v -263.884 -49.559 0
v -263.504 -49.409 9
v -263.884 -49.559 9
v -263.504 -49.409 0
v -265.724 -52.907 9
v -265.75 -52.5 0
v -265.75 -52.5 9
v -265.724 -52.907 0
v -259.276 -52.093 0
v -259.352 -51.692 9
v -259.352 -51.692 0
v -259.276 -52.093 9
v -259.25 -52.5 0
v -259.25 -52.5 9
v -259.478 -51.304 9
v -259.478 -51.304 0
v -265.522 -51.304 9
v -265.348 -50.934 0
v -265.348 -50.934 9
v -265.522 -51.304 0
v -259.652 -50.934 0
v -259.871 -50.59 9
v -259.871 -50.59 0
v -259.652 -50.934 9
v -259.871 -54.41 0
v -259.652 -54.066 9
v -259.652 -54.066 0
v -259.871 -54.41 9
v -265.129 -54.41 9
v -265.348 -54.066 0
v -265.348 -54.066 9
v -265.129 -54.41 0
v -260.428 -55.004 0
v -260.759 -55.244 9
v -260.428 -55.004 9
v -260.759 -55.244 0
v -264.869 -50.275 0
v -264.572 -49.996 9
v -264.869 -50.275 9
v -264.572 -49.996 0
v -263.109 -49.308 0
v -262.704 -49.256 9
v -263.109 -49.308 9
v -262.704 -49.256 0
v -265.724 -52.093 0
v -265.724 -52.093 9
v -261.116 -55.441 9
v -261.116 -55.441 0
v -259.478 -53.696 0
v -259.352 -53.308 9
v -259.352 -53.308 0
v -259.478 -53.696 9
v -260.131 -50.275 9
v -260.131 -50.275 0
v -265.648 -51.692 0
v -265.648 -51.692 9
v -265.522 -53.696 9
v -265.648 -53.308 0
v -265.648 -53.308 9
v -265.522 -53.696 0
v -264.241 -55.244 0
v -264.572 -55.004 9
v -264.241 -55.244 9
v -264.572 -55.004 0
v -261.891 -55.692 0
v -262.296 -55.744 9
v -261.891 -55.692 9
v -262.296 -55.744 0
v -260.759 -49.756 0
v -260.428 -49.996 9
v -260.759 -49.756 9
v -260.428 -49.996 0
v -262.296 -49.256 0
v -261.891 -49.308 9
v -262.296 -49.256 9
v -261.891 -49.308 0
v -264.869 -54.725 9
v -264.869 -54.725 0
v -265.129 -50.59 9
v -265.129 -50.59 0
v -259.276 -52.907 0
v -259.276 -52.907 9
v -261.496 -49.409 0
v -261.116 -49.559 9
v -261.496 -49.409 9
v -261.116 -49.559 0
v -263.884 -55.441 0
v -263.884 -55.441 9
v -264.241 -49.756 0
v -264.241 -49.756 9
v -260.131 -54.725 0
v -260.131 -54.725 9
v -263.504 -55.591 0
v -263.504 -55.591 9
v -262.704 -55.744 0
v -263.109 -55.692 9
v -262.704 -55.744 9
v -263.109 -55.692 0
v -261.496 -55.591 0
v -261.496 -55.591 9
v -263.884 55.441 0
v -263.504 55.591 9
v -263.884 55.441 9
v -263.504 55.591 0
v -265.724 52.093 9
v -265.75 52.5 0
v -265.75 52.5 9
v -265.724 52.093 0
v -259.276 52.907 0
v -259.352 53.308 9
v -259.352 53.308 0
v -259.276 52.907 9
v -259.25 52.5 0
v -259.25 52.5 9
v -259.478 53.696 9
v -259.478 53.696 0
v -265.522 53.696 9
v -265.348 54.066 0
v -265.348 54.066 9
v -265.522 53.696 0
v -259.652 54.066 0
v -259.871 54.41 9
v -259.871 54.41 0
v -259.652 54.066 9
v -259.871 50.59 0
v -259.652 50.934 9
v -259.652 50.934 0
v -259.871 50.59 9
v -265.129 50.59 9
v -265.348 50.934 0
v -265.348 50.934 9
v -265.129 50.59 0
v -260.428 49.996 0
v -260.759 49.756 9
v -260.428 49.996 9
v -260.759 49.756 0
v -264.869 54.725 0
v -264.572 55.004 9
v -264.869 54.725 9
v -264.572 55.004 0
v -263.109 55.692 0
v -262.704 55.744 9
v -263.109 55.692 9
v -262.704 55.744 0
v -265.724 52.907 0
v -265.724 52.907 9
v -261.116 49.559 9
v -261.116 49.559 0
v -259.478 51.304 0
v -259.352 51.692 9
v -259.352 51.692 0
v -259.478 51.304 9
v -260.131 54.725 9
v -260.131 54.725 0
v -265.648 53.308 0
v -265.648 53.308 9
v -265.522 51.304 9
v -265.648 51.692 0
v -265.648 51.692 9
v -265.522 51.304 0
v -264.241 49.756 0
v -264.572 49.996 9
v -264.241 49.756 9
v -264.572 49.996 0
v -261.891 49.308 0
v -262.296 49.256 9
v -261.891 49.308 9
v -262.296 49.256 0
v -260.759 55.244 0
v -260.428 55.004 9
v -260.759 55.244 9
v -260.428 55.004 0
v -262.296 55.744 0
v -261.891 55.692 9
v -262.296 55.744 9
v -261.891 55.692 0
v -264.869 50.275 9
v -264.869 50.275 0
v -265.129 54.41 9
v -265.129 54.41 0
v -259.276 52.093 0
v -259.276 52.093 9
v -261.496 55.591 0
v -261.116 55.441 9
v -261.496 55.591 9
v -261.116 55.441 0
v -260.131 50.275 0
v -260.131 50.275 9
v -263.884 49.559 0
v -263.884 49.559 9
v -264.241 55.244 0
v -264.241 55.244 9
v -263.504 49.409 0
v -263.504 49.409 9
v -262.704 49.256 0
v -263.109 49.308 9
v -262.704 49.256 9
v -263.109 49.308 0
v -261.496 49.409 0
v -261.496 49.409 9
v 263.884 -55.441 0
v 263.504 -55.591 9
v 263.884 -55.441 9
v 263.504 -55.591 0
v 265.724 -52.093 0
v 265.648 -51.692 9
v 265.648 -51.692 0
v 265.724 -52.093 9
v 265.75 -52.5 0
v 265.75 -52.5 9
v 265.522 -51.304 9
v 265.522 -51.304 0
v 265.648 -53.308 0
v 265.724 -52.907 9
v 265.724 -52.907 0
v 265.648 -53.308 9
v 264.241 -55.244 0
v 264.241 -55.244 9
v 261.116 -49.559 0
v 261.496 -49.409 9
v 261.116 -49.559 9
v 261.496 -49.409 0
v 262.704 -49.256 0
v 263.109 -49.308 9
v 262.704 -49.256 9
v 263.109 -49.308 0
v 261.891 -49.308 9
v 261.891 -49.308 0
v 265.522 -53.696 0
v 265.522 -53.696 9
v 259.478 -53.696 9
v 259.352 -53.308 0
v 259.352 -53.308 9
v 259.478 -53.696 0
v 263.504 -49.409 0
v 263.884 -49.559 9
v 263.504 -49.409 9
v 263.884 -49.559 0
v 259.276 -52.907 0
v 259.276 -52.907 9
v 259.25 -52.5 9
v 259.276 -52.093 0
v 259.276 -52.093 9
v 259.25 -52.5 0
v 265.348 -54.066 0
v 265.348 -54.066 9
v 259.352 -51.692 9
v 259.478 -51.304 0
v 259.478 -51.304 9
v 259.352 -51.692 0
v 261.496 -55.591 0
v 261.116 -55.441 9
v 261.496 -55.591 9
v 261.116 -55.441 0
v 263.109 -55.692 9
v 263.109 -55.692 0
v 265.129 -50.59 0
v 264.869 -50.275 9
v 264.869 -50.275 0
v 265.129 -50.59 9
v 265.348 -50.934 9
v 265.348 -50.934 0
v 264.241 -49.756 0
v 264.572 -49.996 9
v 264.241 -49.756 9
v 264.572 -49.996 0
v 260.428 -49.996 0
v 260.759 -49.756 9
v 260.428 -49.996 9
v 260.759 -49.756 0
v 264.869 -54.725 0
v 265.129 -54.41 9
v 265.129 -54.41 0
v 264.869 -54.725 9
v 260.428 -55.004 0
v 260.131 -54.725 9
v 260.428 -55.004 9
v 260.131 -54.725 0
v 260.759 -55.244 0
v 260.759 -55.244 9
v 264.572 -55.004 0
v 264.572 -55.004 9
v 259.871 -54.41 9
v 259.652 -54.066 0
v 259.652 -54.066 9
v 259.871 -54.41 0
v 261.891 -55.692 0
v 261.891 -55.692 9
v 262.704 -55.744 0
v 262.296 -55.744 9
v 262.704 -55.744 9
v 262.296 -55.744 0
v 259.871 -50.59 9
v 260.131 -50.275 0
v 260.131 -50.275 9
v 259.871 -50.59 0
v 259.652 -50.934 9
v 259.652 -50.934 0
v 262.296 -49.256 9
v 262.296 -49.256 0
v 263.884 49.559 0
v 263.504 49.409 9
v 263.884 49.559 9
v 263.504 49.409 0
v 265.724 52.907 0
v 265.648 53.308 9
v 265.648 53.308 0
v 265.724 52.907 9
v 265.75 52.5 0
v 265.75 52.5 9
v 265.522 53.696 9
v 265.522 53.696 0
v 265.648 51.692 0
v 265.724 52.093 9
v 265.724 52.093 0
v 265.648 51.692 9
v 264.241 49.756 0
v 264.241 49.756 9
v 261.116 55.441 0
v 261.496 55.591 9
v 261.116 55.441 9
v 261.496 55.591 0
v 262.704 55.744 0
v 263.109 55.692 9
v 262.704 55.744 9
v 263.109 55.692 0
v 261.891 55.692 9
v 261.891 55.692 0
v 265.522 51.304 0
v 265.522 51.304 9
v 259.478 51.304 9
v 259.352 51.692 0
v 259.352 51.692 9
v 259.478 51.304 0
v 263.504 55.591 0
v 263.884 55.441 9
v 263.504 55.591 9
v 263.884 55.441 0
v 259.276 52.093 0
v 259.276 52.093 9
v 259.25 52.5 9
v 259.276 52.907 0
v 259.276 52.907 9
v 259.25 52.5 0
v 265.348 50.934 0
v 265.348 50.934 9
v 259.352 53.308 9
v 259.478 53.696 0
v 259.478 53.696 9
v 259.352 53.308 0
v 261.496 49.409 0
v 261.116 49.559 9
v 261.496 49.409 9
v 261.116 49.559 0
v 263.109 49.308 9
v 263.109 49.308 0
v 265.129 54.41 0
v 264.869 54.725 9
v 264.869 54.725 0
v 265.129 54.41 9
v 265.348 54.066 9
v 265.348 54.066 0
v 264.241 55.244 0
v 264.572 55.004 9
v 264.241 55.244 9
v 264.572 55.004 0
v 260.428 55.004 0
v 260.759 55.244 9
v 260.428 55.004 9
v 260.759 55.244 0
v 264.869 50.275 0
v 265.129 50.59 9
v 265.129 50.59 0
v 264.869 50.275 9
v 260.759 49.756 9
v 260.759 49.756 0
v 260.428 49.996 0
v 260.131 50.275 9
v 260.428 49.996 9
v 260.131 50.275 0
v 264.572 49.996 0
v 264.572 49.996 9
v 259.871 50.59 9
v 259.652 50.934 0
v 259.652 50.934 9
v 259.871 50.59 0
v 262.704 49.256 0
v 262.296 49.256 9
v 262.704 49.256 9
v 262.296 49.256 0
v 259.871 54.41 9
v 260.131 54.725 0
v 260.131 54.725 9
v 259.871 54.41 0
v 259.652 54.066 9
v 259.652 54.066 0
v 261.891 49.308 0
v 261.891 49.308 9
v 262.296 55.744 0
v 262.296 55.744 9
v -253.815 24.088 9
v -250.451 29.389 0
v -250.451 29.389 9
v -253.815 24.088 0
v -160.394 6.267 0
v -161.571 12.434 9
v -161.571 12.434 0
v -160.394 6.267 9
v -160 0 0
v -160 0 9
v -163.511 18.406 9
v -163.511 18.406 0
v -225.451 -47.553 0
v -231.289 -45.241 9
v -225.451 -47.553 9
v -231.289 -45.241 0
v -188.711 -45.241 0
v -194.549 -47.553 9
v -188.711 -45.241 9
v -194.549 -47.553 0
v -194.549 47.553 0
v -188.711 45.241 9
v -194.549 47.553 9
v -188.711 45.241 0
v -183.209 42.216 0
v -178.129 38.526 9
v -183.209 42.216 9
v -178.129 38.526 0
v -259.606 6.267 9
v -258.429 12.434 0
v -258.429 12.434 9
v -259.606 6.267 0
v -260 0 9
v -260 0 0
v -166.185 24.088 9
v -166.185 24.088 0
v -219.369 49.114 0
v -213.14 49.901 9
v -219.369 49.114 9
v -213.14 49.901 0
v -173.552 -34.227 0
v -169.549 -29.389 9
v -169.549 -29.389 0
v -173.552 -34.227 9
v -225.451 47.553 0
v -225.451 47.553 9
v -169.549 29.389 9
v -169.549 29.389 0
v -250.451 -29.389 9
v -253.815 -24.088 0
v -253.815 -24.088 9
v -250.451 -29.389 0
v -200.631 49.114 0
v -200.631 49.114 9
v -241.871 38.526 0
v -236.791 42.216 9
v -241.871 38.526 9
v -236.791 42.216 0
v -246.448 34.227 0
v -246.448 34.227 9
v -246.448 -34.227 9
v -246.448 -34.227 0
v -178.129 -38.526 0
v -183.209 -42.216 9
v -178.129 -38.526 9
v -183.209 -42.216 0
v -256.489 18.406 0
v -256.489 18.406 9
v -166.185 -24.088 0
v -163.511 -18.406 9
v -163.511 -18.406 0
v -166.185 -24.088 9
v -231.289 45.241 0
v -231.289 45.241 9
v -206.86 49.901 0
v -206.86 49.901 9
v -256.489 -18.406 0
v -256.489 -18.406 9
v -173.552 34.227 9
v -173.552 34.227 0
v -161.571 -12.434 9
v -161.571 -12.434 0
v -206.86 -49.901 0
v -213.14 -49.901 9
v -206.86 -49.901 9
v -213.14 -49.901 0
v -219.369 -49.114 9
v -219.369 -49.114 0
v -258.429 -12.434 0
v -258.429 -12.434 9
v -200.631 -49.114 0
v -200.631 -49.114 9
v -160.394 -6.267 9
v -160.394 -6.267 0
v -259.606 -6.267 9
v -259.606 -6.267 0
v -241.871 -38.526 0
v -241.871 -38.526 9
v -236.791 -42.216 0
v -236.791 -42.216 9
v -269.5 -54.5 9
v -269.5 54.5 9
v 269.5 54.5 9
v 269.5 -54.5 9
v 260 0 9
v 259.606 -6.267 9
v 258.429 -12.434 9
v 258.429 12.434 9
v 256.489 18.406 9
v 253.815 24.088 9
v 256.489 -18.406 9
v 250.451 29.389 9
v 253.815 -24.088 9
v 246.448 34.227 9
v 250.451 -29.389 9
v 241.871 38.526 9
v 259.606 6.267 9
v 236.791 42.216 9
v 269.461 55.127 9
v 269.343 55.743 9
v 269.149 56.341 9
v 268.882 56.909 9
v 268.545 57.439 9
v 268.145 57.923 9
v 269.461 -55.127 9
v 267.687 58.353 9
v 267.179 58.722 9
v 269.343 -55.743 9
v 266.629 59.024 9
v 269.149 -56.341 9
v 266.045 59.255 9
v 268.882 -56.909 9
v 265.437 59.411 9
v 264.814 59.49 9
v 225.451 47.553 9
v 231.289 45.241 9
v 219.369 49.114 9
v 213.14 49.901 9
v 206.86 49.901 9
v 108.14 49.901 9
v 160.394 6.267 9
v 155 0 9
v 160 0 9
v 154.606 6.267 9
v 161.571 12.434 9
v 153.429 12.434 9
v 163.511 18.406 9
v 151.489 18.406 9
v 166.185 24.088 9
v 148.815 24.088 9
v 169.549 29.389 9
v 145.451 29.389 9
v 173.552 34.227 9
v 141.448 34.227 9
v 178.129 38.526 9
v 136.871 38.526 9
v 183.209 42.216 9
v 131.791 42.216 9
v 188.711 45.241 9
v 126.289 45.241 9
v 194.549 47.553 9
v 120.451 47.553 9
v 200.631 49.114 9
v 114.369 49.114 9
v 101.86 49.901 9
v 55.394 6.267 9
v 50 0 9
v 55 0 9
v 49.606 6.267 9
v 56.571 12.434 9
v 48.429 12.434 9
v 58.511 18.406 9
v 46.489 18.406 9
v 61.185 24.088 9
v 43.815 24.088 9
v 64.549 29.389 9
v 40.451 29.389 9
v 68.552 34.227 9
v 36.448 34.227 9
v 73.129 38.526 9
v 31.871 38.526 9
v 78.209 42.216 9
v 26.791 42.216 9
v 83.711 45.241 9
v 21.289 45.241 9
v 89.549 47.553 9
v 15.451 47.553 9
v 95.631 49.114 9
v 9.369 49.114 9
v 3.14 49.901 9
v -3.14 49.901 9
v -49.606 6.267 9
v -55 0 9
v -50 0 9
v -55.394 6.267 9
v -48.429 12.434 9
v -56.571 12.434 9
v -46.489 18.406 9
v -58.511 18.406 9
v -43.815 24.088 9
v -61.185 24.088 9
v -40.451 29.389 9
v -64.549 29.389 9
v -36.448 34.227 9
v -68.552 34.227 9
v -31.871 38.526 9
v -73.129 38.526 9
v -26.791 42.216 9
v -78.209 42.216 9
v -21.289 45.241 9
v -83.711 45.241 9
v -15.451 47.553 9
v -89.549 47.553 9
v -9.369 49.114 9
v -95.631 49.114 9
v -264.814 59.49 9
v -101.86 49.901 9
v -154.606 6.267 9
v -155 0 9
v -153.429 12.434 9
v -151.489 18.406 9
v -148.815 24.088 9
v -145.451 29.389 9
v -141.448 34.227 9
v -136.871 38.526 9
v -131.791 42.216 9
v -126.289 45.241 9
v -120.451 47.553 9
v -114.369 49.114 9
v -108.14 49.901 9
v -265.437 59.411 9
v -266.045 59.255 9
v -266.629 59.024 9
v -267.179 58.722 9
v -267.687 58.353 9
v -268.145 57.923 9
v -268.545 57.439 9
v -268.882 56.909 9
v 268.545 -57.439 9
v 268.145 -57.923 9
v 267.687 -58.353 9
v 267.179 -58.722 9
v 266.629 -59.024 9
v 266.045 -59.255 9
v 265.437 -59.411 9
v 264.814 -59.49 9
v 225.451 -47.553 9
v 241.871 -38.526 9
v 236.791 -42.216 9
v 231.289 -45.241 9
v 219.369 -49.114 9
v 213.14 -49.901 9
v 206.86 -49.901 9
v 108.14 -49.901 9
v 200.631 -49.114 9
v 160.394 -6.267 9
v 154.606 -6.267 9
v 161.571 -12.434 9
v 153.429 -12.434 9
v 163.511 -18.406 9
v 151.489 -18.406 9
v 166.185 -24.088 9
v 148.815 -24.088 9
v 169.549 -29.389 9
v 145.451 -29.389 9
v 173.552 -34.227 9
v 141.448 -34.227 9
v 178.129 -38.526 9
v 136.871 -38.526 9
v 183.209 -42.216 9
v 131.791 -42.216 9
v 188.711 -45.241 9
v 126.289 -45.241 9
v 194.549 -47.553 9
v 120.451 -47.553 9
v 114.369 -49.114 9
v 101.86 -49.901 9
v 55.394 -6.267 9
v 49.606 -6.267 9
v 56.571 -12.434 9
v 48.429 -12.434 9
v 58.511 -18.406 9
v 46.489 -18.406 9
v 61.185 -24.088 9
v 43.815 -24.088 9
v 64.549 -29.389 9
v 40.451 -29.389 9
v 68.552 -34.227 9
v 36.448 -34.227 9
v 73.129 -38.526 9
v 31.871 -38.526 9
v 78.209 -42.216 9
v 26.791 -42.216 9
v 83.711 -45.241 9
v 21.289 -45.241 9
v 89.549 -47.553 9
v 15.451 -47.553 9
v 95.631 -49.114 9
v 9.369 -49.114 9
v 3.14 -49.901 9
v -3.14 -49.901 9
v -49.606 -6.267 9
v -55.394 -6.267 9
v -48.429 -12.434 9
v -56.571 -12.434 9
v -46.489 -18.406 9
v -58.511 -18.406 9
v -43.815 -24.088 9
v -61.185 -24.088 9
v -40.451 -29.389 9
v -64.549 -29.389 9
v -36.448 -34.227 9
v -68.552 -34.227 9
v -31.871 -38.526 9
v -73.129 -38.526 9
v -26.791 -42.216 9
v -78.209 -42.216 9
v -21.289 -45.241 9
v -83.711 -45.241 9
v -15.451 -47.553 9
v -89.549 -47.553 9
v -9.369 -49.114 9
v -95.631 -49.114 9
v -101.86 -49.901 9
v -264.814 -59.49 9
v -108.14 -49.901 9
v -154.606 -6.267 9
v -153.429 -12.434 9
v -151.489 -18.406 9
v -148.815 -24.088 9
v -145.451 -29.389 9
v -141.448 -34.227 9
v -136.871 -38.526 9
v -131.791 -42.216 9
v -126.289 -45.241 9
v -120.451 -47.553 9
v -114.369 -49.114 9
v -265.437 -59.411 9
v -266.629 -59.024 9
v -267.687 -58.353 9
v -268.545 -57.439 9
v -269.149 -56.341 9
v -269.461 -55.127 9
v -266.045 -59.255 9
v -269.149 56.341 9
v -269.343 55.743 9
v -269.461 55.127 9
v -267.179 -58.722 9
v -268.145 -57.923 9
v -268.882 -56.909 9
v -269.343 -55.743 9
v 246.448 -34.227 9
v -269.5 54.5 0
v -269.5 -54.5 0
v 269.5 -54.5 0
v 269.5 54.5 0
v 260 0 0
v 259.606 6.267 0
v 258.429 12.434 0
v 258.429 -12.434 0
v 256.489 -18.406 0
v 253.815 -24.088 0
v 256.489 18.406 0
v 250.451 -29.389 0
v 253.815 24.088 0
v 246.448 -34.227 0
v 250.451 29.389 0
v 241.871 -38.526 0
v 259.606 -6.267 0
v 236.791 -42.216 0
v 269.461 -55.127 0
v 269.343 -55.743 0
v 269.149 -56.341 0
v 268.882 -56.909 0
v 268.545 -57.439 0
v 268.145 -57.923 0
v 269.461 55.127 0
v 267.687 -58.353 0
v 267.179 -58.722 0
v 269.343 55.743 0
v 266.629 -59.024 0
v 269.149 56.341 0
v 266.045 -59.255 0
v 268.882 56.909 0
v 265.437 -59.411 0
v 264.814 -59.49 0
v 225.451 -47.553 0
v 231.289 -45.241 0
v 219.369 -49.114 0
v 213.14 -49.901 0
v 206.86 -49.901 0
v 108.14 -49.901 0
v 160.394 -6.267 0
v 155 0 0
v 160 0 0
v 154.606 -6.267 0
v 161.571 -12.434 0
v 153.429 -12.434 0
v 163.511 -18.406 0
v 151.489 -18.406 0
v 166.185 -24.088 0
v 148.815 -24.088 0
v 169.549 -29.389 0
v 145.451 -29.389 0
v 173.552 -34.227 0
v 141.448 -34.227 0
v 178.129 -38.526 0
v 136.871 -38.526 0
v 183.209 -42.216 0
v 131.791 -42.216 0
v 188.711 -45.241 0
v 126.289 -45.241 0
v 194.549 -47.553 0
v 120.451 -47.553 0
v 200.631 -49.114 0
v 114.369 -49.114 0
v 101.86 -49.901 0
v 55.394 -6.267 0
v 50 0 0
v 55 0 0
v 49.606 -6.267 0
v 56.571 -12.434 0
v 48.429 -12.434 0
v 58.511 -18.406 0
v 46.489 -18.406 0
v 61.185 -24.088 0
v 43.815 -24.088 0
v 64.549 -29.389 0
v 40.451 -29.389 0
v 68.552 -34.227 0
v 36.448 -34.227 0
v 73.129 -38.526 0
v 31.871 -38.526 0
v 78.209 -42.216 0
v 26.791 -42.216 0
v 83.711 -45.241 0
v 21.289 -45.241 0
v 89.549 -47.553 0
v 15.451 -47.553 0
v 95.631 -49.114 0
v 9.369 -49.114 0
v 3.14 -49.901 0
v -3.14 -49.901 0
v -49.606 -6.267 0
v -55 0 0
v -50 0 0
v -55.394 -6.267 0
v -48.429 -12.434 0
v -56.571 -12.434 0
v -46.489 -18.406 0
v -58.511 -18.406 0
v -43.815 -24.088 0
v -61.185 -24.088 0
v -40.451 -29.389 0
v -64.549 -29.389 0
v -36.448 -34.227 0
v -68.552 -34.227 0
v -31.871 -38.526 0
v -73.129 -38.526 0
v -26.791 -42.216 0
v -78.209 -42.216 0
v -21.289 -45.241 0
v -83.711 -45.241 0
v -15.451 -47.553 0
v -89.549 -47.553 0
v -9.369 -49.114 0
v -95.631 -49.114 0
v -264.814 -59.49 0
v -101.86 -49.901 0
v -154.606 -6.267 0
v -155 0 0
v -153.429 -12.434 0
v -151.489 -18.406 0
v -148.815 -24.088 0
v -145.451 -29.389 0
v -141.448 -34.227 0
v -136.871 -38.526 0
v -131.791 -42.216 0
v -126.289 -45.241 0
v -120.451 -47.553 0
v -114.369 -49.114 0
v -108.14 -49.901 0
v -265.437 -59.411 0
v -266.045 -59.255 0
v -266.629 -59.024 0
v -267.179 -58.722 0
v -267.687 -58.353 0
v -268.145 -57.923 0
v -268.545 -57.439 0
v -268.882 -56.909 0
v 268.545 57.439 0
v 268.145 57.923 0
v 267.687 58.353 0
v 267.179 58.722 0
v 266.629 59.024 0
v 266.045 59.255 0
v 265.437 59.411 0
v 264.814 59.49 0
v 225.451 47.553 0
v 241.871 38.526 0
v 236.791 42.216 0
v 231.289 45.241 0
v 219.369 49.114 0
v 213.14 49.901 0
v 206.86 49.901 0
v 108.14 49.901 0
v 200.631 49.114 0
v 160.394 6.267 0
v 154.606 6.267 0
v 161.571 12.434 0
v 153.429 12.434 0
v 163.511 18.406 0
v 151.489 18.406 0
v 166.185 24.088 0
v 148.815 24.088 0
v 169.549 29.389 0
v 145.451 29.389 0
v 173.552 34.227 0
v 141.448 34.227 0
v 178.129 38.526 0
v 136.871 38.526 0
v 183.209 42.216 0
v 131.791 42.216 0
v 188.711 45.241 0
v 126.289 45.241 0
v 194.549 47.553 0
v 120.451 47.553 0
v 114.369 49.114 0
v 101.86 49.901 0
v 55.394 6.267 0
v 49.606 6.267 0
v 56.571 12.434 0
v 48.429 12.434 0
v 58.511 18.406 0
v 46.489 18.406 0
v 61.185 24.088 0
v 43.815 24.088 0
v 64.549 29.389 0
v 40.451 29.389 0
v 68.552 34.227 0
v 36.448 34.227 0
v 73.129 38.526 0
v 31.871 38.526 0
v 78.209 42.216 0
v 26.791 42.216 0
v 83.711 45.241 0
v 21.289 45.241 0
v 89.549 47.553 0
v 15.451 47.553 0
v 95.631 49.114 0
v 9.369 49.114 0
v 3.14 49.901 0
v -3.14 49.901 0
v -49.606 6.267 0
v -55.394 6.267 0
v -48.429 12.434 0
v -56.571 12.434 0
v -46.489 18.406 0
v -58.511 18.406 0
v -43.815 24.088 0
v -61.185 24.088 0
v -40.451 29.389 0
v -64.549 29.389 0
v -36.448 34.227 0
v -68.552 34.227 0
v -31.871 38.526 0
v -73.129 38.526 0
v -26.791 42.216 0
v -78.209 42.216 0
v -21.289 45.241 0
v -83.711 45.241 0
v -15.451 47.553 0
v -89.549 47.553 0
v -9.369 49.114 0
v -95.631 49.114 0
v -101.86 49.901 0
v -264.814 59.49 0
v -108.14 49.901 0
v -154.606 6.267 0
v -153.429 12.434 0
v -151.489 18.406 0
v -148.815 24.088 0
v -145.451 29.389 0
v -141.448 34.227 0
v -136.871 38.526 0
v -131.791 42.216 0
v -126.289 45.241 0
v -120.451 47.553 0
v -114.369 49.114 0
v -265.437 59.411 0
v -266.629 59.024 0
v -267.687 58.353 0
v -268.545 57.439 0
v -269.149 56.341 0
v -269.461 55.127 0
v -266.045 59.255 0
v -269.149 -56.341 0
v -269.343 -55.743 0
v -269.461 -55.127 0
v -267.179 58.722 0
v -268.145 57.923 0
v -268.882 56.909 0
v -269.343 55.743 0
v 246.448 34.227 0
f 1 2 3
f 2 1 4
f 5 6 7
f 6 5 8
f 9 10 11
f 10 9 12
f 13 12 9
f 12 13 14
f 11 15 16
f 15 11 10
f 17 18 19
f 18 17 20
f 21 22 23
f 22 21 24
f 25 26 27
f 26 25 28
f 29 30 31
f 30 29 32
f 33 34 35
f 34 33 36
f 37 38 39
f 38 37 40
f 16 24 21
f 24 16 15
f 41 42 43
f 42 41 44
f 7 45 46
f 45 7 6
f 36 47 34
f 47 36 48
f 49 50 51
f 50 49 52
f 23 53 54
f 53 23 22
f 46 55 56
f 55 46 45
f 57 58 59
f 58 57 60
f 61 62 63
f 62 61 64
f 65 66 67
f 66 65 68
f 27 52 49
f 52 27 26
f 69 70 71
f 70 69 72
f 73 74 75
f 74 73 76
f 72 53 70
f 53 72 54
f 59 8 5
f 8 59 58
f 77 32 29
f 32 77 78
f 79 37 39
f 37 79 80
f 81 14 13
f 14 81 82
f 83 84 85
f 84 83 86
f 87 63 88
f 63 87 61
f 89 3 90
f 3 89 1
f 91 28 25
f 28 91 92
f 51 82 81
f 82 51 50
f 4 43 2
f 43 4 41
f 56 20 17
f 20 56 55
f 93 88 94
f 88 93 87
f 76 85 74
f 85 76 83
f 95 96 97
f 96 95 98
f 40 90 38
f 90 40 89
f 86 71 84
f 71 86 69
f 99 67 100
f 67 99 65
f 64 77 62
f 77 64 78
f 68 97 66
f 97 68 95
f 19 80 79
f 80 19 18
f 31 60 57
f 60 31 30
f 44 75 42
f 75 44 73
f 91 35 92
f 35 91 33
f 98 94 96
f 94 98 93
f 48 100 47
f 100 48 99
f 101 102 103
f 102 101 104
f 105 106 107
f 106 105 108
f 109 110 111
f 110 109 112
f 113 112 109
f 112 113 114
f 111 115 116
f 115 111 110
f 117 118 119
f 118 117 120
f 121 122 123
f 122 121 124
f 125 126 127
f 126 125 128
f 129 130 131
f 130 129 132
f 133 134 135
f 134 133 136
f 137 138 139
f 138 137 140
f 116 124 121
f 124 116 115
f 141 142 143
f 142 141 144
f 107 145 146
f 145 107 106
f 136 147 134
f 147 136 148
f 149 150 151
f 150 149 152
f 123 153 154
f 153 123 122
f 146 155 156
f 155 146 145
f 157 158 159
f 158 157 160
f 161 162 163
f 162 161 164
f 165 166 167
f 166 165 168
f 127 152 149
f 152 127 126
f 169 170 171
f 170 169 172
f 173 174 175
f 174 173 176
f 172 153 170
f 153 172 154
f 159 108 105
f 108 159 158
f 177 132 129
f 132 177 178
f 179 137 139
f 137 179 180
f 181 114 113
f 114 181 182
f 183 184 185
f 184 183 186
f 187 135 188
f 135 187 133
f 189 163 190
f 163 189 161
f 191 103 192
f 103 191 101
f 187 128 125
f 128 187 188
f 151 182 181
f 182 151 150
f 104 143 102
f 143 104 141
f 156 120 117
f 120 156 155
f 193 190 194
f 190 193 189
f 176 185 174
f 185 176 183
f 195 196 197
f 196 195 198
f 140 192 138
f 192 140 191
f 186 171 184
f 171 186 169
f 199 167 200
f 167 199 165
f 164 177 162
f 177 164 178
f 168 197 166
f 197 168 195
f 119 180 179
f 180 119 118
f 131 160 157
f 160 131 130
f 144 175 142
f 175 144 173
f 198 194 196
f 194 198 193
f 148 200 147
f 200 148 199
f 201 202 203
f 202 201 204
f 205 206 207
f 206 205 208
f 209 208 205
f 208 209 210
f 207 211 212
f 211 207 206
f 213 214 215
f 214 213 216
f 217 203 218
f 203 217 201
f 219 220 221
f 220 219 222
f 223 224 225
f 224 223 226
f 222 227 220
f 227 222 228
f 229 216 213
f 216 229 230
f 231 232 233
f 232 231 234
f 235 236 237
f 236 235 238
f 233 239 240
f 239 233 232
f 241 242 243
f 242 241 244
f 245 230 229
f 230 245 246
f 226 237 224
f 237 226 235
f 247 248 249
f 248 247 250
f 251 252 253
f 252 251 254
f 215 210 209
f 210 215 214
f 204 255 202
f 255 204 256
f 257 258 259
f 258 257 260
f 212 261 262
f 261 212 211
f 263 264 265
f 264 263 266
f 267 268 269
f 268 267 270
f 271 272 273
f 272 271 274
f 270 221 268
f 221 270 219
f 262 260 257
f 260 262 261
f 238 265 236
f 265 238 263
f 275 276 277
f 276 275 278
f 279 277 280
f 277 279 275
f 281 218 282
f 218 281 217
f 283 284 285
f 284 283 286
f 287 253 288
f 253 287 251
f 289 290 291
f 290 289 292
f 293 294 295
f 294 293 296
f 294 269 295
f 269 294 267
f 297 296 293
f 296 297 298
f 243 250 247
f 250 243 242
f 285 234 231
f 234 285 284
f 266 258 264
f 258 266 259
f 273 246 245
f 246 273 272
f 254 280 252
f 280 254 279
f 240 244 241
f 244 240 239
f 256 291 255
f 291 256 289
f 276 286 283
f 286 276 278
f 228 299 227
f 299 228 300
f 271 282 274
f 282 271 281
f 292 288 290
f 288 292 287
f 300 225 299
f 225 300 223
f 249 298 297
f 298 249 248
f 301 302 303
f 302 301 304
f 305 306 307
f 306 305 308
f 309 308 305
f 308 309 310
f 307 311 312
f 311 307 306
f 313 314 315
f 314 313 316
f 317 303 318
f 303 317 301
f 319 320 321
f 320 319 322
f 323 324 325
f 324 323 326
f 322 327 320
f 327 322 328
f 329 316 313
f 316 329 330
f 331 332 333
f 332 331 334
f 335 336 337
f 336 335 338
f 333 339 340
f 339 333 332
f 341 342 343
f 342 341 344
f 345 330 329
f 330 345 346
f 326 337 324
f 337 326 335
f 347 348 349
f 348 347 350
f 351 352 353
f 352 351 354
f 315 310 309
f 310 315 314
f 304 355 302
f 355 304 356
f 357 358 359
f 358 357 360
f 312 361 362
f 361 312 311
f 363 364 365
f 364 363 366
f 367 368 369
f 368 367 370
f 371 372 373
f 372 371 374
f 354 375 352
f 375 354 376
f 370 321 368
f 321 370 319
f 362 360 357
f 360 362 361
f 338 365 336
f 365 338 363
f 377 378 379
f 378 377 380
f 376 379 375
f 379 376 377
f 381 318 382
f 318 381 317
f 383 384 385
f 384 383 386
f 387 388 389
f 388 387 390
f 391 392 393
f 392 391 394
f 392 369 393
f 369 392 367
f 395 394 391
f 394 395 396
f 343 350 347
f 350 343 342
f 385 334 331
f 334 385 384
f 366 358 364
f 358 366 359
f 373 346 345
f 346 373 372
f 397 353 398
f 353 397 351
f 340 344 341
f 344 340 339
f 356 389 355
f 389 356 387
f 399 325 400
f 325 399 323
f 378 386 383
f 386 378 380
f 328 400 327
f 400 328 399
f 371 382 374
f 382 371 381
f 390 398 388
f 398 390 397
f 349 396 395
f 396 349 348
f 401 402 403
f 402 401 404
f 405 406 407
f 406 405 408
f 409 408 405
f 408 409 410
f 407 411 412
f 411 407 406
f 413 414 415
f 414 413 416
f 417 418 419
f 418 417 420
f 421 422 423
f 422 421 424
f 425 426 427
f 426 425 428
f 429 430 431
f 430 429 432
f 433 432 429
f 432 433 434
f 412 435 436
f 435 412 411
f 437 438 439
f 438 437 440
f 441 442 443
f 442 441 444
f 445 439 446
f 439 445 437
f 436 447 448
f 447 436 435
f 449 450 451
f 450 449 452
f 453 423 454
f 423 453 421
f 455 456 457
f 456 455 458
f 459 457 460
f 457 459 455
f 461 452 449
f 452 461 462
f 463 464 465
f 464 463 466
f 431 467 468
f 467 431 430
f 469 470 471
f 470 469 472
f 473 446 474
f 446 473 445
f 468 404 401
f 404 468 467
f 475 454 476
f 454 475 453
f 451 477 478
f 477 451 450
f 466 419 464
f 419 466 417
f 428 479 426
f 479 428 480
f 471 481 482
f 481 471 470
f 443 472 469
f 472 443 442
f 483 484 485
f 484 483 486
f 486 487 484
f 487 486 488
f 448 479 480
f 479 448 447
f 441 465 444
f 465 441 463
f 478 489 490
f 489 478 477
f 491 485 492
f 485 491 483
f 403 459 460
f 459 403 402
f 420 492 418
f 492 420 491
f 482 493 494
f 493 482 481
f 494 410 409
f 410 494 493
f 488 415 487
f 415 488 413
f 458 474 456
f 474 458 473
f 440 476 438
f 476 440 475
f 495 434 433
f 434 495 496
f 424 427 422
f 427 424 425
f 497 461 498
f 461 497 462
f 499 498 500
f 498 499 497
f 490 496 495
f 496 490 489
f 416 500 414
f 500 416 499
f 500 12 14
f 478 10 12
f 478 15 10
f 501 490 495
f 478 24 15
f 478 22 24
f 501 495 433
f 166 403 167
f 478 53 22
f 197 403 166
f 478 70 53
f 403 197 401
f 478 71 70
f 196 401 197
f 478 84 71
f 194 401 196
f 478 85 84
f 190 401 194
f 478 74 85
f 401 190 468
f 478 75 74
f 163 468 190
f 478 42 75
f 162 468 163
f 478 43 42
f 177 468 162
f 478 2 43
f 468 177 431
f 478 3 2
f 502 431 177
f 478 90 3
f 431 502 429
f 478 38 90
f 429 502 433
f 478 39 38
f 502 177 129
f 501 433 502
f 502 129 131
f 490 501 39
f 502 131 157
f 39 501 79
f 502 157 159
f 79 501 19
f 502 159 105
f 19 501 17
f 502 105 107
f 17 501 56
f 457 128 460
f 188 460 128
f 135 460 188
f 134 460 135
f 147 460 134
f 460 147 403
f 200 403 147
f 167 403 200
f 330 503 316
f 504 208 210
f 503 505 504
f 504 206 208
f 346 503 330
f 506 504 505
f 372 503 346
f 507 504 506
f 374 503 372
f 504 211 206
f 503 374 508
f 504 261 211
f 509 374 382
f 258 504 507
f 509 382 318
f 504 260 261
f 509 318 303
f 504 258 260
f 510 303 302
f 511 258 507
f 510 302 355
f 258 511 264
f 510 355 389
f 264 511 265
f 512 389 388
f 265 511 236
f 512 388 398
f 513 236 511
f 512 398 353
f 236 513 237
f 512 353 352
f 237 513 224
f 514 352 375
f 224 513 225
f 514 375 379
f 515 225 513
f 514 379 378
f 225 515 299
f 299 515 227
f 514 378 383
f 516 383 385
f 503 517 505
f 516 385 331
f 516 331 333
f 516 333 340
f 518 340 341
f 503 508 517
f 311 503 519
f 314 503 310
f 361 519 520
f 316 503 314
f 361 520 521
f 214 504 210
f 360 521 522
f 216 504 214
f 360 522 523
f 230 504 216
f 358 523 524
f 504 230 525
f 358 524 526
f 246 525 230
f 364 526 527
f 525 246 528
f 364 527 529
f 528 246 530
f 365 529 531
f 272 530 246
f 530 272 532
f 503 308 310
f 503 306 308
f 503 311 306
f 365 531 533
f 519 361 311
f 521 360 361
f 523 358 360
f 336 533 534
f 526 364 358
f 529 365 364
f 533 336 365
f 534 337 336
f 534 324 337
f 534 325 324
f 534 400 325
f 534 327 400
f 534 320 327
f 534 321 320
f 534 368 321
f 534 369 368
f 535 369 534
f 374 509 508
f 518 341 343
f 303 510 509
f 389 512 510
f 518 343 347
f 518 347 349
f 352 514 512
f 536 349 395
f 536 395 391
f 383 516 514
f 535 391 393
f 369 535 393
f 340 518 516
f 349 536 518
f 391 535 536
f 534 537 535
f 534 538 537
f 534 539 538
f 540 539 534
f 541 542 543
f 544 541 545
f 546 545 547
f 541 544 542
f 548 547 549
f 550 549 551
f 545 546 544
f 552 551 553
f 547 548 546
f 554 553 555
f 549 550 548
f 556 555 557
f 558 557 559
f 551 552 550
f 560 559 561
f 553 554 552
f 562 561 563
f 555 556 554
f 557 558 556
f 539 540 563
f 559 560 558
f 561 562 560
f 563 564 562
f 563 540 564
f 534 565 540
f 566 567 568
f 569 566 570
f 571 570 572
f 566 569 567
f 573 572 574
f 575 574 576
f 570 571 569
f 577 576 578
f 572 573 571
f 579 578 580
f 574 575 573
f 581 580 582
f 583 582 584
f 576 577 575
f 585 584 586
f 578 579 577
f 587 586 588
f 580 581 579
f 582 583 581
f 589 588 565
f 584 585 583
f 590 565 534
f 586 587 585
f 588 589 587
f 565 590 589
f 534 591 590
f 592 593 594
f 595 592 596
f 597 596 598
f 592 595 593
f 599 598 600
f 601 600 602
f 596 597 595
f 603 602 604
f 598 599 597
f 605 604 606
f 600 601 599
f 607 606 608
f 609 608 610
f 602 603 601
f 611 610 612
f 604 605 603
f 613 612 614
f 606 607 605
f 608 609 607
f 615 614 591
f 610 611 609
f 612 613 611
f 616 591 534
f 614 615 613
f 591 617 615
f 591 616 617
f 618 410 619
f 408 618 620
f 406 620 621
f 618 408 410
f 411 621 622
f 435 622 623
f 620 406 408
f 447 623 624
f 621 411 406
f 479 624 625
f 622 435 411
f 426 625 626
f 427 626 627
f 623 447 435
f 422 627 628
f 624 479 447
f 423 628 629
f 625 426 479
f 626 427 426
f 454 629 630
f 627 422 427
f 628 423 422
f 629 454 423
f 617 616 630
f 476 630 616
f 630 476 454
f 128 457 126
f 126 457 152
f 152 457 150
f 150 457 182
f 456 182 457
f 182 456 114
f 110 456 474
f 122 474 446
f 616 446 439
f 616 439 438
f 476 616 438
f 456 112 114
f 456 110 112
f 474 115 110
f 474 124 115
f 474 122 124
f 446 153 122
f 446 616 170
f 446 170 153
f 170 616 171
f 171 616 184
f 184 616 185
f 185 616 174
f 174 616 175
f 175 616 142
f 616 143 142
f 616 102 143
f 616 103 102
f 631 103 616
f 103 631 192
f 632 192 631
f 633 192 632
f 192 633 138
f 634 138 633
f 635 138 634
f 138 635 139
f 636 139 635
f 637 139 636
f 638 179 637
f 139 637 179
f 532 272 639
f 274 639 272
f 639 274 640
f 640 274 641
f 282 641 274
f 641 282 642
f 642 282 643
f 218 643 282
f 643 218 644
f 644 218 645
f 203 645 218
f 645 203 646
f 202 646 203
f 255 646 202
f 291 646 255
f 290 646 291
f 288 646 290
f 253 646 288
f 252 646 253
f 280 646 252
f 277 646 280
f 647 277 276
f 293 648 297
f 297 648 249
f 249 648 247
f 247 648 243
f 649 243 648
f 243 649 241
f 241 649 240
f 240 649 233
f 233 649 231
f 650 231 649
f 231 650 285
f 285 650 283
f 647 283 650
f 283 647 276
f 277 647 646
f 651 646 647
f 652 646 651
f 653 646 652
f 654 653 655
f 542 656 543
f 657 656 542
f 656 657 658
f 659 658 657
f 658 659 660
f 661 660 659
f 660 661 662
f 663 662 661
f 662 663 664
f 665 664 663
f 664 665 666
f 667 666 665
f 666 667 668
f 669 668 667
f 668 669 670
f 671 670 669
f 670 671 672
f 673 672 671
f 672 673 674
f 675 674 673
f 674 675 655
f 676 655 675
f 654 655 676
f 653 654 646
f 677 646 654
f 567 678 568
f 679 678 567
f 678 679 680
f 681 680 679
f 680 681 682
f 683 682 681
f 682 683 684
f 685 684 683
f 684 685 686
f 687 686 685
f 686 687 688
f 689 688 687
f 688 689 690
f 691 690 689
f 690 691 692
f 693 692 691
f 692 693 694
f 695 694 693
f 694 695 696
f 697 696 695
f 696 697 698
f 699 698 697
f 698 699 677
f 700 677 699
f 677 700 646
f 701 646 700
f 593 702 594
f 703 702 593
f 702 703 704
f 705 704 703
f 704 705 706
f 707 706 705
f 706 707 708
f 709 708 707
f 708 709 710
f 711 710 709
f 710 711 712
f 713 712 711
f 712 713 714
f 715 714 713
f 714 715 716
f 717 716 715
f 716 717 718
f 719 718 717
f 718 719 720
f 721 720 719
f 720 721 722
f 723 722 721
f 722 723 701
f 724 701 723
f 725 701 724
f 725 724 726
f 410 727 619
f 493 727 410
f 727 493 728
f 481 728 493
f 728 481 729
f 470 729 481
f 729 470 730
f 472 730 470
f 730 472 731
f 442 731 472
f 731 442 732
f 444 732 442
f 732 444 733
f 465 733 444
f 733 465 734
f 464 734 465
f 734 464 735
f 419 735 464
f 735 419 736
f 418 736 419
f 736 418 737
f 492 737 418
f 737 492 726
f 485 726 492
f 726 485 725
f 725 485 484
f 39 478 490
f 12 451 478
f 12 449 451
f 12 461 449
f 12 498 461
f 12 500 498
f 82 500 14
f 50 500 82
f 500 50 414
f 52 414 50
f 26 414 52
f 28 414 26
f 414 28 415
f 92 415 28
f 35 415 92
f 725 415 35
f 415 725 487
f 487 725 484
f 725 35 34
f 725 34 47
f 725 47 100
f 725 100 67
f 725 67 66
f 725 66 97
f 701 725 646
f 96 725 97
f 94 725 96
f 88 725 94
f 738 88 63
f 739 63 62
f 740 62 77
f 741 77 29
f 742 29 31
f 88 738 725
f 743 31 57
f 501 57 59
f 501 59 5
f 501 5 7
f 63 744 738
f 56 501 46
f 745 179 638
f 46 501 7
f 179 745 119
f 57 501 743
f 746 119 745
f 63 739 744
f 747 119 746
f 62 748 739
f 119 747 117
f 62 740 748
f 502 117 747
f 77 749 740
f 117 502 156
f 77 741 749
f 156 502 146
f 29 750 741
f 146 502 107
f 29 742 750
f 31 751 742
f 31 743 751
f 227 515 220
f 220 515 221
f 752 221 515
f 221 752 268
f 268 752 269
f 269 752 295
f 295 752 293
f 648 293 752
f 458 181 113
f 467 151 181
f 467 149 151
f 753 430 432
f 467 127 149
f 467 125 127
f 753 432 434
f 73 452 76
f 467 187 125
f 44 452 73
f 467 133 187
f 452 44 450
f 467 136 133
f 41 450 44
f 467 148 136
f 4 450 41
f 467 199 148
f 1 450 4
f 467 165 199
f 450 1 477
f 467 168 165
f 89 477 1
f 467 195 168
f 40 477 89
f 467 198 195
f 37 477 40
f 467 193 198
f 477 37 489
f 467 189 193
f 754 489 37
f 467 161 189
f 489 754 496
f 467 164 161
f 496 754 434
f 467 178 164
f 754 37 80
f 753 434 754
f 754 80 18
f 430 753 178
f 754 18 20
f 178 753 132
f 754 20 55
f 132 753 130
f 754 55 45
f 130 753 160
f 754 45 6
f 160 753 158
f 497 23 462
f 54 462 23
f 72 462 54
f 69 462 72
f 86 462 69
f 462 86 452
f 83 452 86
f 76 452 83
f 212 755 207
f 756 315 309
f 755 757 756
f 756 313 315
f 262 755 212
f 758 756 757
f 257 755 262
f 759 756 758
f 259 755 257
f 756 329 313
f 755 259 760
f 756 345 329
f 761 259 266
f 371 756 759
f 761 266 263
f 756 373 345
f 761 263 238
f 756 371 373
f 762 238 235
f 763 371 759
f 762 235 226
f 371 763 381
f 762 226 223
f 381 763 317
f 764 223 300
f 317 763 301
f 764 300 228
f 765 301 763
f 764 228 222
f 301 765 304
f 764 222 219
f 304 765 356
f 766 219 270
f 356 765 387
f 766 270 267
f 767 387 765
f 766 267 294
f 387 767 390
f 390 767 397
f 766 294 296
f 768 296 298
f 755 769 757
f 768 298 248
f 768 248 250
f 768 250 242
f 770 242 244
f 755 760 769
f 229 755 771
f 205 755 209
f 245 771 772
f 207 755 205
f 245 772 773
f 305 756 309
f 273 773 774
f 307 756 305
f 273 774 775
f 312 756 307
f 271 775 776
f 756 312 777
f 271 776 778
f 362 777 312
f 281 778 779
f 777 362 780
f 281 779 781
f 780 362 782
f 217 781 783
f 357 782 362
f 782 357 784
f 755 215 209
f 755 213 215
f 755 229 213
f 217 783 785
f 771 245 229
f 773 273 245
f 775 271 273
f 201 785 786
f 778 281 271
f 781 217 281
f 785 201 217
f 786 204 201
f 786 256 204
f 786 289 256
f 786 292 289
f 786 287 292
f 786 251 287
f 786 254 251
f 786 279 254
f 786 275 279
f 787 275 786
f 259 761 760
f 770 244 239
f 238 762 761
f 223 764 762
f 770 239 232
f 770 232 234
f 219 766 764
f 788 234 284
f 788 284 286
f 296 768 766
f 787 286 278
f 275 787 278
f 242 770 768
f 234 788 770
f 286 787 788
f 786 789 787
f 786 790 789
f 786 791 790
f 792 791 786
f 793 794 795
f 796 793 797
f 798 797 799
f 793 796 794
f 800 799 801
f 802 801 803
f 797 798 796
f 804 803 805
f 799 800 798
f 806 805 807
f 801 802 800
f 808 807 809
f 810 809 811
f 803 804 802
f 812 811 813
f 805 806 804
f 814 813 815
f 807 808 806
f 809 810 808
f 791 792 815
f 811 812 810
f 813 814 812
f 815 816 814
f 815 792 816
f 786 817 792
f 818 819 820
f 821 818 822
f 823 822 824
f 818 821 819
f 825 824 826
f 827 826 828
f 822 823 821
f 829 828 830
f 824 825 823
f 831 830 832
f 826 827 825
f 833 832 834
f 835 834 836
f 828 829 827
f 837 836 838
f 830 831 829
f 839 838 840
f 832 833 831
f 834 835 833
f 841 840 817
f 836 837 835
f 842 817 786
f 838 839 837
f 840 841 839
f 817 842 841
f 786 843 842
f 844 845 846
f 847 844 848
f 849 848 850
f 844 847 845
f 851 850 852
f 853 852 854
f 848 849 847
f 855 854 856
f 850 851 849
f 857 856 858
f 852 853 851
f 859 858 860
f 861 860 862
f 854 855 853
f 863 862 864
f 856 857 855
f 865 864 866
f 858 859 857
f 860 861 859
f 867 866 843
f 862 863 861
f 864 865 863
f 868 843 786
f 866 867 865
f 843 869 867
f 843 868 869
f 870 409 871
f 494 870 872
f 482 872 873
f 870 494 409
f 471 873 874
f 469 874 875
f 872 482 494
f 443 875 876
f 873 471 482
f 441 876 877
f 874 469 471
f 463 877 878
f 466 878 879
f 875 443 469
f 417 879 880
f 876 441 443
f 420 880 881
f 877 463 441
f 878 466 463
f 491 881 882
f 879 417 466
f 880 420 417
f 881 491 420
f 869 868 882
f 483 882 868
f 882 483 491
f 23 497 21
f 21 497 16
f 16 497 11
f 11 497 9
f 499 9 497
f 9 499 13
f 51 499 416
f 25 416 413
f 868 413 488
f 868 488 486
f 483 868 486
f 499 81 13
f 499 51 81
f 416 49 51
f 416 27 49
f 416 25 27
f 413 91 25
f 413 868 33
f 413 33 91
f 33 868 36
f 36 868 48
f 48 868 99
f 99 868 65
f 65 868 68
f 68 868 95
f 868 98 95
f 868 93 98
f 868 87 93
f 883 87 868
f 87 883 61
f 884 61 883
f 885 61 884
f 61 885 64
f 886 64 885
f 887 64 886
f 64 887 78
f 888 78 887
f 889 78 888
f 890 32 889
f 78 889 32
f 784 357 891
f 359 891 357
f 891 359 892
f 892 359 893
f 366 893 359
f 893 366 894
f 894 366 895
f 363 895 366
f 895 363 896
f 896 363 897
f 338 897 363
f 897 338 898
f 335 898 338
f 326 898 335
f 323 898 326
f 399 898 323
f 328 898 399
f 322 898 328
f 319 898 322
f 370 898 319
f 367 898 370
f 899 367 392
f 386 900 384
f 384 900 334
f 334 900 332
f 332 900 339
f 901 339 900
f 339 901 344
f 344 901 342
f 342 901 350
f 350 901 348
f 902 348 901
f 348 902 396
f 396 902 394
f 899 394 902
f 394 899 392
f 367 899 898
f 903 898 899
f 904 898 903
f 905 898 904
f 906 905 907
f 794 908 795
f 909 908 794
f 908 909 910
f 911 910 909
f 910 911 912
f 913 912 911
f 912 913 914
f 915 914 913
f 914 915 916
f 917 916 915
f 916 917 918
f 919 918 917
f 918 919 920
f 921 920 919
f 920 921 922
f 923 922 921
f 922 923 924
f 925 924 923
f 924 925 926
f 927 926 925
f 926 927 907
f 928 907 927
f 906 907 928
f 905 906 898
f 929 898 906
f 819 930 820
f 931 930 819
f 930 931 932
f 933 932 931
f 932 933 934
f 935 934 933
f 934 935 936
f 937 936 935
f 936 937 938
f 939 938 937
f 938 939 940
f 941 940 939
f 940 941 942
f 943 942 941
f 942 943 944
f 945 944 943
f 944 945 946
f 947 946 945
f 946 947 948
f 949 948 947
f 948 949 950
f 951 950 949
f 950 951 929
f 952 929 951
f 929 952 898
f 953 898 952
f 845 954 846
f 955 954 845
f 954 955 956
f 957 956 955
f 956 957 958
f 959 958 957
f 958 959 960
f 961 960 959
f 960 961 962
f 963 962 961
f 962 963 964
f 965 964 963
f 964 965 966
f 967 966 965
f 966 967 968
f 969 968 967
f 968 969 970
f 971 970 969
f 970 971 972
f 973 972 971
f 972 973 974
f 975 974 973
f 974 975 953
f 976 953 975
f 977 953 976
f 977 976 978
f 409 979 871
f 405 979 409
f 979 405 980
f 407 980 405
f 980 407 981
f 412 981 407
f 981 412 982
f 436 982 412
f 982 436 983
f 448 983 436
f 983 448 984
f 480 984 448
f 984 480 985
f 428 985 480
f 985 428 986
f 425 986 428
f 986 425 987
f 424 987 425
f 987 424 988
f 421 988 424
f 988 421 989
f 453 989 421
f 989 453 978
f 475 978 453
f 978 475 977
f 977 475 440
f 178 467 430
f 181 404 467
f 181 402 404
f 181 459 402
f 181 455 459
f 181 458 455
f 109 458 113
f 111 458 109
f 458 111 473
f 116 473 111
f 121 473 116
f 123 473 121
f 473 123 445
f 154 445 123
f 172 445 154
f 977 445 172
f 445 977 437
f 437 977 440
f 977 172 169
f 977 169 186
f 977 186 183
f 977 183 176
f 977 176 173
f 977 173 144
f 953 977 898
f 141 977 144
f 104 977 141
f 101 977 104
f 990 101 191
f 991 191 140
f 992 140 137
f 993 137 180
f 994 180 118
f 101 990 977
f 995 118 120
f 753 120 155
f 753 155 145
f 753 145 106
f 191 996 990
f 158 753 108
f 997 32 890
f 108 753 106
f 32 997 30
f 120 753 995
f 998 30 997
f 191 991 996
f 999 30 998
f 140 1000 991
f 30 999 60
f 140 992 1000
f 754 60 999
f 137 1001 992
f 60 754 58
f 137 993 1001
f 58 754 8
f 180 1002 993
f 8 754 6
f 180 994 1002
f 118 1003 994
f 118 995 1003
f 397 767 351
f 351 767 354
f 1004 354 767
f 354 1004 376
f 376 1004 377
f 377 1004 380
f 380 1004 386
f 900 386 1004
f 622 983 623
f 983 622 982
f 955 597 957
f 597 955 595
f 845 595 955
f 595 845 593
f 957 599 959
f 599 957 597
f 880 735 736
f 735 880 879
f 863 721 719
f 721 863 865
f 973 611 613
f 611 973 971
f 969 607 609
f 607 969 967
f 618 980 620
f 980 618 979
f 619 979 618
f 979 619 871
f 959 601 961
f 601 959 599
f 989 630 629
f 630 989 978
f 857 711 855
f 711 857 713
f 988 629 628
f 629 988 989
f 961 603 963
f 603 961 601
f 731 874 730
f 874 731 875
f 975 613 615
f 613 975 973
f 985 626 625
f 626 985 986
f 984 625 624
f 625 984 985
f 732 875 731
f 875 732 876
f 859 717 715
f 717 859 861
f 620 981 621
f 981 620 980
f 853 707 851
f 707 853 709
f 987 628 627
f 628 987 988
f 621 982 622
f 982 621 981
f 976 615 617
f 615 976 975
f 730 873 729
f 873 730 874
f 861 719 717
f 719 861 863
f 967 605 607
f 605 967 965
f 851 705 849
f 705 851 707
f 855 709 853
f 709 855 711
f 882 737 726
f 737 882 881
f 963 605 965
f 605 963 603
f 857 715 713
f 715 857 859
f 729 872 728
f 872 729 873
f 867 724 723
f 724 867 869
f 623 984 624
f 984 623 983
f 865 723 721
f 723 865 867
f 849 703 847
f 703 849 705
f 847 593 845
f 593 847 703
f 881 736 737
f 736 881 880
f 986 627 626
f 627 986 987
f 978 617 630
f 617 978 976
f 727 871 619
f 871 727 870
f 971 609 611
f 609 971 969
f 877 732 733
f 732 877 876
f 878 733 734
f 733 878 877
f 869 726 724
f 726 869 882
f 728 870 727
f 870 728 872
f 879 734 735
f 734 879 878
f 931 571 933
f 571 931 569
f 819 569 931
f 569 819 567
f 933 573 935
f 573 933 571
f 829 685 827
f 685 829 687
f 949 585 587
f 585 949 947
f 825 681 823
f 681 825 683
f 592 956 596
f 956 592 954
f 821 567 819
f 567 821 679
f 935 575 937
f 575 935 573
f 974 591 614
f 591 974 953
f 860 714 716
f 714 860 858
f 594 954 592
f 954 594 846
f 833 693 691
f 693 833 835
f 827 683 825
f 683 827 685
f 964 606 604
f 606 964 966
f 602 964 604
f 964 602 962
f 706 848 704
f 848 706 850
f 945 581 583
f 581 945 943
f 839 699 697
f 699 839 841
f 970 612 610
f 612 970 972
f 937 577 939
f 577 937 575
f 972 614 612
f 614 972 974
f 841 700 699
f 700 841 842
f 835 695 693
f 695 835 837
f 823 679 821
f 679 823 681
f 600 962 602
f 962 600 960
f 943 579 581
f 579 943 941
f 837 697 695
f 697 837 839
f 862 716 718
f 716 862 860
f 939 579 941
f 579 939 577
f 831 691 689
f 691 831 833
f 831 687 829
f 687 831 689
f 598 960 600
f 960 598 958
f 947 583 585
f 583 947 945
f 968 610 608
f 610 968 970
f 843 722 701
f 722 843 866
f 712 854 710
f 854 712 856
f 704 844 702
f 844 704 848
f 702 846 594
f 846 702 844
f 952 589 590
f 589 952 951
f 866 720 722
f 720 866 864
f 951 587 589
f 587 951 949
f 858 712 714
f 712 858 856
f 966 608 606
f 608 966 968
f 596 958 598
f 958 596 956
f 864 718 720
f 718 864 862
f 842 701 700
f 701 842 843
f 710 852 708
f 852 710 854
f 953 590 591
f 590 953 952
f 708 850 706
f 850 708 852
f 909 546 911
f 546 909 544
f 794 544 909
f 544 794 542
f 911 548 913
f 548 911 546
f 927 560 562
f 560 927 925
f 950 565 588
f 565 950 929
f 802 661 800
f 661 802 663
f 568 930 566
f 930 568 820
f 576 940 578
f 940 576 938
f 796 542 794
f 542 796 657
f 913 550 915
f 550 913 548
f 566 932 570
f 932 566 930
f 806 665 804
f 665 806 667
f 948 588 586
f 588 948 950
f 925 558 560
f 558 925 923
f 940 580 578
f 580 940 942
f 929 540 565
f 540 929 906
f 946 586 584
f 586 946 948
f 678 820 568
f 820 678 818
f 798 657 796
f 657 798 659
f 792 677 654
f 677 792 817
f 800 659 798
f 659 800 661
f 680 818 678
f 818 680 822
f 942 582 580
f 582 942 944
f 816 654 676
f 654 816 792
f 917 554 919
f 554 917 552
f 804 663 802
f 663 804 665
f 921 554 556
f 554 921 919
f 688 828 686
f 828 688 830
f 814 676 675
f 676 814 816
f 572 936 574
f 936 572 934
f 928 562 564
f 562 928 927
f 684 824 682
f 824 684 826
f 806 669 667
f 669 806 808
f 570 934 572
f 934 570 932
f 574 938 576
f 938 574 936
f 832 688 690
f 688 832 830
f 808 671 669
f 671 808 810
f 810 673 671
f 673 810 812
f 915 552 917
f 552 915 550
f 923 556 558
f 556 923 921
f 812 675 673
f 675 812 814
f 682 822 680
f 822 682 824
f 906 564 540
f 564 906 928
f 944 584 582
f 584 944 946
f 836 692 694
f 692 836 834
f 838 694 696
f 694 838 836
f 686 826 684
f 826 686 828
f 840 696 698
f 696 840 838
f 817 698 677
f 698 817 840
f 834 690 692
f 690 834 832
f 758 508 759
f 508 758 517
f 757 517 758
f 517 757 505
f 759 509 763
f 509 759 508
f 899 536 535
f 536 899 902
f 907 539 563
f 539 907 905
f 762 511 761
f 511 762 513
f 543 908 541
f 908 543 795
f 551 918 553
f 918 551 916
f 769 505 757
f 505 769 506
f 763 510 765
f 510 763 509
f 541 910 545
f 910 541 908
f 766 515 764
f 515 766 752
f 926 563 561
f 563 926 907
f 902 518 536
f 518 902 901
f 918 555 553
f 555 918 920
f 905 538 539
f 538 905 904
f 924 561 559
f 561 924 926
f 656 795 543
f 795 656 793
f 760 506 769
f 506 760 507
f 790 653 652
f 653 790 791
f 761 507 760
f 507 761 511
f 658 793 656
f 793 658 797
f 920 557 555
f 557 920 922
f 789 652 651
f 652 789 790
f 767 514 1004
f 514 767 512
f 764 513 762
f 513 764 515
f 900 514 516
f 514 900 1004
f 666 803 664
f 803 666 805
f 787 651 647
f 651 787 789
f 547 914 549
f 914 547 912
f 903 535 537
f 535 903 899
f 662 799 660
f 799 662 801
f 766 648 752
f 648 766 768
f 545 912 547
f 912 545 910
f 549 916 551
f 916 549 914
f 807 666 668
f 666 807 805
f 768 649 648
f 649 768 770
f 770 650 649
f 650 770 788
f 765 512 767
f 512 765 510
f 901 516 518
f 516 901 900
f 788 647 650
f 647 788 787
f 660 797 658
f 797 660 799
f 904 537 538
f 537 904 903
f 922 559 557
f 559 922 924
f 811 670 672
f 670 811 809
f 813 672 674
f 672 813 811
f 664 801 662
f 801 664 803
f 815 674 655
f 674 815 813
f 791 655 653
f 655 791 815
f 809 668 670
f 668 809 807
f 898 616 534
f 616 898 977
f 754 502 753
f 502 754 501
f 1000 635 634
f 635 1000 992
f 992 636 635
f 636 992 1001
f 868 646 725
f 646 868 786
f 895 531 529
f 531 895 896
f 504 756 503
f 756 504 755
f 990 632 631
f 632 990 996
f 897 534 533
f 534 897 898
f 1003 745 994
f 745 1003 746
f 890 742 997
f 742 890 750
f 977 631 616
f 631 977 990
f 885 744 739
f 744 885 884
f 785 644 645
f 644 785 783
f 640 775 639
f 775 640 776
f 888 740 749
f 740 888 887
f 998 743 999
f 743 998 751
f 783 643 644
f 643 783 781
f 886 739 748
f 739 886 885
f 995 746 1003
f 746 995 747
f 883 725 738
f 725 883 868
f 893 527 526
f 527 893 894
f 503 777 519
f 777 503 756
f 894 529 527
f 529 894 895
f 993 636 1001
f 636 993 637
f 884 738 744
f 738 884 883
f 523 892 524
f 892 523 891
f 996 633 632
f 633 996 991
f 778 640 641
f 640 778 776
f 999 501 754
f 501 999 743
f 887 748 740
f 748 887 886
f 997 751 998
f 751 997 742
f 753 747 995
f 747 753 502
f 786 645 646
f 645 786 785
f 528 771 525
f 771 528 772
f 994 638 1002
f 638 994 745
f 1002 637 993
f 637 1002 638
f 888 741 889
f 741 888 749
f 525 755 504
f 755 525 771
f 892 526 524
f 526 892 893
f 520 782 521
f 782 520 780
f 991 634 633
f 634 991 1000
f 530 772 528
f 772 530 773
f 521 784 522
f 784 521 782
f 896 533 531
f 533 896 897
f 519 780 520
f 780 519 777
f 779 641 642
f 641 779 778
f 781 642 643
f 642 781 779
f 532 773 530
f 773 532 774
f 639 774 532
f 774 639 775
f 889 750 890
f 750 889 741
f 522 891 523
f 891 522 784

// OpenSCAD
$fn = 50;

difference() {
	union() {
		hull() {
			translate(v = [-264.5, 54.5, 0]) {
				cylinder(h = 9, r = 5);
			}
			translate(v = [264.5, 54.5, 0]) {
				cylinder(h = 9, r = 5);
			}
			translate(v = [-264.5, -54.5, 0]) {
				cylinder(h = 9, r = 5);
			}
			translate(v = [264.5, -54.5, 0]) {
				cylinder(h = 9, r = 5);
			}
		}
	}
	union() {
		translate(v = [-262.5, -52.5, -100.0]) {
			cylinder(h = 200, r = 3.25);
		}
		translate(v = [-262.5, 52.5, -100.0]) {
			cylinder(h = 200, r = 3.25);
		}
		translate(v = [262.5, -52.5, -100.0]) {
			cylinder(h = 200, r = 3.25);
		}
		translate(v = [262.5, 52.5, -100.0]) {
			cylinder(h = 200, r = 3.25);
		}
		translate(v = [-262.5, -52.5, -100.0]) {
			cylinder(h = 200, r = 1.8);
		}
		translate(v = [-262.5, 52.5, -100.0]) {
			cylinder(h = 200, r = 1.8);
		}
		translate(v = [262.5, -52.5, -100.0]) {
			cylinder(h = 200, r = 1.8);
		}
		translate(v = [262.5, 52.5, -100.0]) {
			cylinder(h = 200, r = 1.8);
		}
		translate(v = [-210.0, 0, 0.0]) {
			cylinder(h = 9, r = 50.0);
		}
		translate(v = [-105.0, 0, 0.0]) {
			cylinder(h = 9, r = 50.0);
		}
		cylinder(h = 9, r = 50.0);
		translate(v = [105.0, 0, 0.0]) {
			cylinder(h = 9, r = 50.0);
		}
		translate(v = [210.0, 0, 0.0]) {
			cylinder(h = 9, r = 50.0);
		}
	}
}
